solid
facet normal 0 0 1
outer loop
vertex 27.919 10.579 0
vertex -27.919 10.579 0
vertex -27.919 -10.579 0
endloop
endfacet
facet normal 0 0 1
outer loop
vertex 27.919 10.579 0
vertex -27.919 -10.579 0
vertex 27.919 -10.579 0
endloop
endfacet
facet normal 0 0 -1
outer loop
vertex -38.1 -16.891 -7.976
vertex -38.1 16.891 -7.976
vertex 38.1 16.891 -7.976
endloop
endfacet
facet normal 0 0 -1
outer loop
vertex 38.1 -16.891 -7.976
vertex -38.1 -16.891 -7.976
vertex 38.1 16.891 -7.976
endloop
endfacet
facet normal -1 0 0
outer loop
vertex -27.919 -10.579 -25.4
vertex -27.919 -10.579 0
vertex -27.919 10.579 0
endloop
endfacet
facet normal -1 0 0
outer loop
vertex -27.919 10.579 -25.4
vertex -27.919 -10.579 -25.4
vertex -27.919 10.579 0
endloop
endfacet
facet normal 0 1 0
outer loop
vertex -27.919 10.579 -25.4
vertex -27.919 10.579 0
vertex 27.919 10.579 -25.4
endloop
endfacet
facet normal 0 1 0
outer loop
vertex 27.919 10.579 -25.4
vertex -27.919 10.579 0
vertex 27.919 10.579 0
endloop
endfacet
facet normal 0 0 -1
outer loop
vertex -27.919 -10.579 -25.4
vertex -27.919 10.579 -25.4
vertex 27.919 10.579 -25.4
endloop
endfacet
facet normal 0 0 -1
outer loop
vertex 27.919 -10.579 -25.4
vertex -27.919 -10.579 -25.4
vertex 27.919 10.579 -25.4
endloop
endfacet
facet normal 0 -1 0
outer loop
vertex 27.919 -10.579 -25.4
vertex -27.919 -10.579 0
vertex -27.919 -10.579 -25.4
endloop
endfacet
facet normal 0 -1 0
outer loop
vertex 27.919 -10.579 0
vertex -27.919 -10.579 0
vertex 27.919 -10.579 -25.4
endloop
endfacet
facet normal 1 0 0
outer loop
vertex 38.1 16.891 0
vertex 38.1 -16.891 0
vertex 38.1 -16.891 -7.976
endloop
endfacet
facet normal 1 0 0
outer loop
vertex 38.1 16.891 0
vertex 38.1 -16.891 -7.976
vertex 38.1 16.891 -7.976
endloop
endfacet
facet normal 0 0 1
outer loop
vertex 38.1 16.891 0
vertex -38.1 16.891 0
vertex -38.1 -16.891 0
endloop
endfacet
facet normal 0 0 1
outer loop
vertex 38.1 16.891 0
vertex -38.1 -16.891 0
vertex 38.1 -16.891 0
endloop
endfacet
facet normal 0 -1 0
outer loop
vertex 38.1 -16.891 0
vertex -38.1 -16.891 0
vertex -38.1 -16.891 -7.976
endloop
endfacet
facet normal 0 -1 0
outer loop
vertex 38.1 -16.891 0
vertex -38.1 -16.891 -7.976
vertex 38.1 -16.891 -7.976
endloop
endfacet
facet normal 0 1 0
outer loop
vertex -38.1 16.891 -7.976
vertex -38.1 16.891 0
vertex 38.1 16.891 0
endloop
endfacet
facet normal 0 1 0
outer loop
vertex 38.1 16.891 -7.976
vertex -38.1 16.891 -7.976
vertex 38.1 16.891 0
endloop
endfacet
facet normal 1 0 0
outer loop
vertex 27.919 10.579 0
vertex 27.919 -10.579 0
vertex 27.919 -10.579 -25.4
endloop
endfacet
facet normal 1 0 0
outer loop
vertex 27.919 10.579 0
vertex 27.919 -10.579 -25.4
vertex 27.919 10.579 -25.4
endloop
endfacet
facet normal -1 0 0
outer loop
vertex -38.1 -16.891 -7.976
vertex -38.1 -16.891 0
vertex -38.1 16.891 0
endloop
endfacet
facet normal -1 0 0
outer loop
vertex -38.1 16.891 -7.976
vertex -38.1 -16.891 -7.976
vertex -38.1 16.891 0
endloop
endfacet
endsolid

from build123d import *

# Parameters (mm, degrees)
F0_W     = 76.2
F0_H     = 33.782
F1_DEPTH = 7.9756
F2_W     = 55.838562
F2_H     = 21.1582
F3_DEPTH = 25.4


with BuildPart() as f1:
    # F0 (on Top) → F1 (new body)
    with BuildSketch(Plane.XY):
        Rectangle(F0_W, F0_H)
    extrude(amount=-F1_DEPTH)


with BuildPart() as f3:
    # F2 (on face) → F3 (new body)
    with BuildSketch(Plane.XY):
        Rectangle(F2_W, F2_H)
    extrude(amount=-F3_DEPTH)


solid = Compound([f1.part, f3.part])
